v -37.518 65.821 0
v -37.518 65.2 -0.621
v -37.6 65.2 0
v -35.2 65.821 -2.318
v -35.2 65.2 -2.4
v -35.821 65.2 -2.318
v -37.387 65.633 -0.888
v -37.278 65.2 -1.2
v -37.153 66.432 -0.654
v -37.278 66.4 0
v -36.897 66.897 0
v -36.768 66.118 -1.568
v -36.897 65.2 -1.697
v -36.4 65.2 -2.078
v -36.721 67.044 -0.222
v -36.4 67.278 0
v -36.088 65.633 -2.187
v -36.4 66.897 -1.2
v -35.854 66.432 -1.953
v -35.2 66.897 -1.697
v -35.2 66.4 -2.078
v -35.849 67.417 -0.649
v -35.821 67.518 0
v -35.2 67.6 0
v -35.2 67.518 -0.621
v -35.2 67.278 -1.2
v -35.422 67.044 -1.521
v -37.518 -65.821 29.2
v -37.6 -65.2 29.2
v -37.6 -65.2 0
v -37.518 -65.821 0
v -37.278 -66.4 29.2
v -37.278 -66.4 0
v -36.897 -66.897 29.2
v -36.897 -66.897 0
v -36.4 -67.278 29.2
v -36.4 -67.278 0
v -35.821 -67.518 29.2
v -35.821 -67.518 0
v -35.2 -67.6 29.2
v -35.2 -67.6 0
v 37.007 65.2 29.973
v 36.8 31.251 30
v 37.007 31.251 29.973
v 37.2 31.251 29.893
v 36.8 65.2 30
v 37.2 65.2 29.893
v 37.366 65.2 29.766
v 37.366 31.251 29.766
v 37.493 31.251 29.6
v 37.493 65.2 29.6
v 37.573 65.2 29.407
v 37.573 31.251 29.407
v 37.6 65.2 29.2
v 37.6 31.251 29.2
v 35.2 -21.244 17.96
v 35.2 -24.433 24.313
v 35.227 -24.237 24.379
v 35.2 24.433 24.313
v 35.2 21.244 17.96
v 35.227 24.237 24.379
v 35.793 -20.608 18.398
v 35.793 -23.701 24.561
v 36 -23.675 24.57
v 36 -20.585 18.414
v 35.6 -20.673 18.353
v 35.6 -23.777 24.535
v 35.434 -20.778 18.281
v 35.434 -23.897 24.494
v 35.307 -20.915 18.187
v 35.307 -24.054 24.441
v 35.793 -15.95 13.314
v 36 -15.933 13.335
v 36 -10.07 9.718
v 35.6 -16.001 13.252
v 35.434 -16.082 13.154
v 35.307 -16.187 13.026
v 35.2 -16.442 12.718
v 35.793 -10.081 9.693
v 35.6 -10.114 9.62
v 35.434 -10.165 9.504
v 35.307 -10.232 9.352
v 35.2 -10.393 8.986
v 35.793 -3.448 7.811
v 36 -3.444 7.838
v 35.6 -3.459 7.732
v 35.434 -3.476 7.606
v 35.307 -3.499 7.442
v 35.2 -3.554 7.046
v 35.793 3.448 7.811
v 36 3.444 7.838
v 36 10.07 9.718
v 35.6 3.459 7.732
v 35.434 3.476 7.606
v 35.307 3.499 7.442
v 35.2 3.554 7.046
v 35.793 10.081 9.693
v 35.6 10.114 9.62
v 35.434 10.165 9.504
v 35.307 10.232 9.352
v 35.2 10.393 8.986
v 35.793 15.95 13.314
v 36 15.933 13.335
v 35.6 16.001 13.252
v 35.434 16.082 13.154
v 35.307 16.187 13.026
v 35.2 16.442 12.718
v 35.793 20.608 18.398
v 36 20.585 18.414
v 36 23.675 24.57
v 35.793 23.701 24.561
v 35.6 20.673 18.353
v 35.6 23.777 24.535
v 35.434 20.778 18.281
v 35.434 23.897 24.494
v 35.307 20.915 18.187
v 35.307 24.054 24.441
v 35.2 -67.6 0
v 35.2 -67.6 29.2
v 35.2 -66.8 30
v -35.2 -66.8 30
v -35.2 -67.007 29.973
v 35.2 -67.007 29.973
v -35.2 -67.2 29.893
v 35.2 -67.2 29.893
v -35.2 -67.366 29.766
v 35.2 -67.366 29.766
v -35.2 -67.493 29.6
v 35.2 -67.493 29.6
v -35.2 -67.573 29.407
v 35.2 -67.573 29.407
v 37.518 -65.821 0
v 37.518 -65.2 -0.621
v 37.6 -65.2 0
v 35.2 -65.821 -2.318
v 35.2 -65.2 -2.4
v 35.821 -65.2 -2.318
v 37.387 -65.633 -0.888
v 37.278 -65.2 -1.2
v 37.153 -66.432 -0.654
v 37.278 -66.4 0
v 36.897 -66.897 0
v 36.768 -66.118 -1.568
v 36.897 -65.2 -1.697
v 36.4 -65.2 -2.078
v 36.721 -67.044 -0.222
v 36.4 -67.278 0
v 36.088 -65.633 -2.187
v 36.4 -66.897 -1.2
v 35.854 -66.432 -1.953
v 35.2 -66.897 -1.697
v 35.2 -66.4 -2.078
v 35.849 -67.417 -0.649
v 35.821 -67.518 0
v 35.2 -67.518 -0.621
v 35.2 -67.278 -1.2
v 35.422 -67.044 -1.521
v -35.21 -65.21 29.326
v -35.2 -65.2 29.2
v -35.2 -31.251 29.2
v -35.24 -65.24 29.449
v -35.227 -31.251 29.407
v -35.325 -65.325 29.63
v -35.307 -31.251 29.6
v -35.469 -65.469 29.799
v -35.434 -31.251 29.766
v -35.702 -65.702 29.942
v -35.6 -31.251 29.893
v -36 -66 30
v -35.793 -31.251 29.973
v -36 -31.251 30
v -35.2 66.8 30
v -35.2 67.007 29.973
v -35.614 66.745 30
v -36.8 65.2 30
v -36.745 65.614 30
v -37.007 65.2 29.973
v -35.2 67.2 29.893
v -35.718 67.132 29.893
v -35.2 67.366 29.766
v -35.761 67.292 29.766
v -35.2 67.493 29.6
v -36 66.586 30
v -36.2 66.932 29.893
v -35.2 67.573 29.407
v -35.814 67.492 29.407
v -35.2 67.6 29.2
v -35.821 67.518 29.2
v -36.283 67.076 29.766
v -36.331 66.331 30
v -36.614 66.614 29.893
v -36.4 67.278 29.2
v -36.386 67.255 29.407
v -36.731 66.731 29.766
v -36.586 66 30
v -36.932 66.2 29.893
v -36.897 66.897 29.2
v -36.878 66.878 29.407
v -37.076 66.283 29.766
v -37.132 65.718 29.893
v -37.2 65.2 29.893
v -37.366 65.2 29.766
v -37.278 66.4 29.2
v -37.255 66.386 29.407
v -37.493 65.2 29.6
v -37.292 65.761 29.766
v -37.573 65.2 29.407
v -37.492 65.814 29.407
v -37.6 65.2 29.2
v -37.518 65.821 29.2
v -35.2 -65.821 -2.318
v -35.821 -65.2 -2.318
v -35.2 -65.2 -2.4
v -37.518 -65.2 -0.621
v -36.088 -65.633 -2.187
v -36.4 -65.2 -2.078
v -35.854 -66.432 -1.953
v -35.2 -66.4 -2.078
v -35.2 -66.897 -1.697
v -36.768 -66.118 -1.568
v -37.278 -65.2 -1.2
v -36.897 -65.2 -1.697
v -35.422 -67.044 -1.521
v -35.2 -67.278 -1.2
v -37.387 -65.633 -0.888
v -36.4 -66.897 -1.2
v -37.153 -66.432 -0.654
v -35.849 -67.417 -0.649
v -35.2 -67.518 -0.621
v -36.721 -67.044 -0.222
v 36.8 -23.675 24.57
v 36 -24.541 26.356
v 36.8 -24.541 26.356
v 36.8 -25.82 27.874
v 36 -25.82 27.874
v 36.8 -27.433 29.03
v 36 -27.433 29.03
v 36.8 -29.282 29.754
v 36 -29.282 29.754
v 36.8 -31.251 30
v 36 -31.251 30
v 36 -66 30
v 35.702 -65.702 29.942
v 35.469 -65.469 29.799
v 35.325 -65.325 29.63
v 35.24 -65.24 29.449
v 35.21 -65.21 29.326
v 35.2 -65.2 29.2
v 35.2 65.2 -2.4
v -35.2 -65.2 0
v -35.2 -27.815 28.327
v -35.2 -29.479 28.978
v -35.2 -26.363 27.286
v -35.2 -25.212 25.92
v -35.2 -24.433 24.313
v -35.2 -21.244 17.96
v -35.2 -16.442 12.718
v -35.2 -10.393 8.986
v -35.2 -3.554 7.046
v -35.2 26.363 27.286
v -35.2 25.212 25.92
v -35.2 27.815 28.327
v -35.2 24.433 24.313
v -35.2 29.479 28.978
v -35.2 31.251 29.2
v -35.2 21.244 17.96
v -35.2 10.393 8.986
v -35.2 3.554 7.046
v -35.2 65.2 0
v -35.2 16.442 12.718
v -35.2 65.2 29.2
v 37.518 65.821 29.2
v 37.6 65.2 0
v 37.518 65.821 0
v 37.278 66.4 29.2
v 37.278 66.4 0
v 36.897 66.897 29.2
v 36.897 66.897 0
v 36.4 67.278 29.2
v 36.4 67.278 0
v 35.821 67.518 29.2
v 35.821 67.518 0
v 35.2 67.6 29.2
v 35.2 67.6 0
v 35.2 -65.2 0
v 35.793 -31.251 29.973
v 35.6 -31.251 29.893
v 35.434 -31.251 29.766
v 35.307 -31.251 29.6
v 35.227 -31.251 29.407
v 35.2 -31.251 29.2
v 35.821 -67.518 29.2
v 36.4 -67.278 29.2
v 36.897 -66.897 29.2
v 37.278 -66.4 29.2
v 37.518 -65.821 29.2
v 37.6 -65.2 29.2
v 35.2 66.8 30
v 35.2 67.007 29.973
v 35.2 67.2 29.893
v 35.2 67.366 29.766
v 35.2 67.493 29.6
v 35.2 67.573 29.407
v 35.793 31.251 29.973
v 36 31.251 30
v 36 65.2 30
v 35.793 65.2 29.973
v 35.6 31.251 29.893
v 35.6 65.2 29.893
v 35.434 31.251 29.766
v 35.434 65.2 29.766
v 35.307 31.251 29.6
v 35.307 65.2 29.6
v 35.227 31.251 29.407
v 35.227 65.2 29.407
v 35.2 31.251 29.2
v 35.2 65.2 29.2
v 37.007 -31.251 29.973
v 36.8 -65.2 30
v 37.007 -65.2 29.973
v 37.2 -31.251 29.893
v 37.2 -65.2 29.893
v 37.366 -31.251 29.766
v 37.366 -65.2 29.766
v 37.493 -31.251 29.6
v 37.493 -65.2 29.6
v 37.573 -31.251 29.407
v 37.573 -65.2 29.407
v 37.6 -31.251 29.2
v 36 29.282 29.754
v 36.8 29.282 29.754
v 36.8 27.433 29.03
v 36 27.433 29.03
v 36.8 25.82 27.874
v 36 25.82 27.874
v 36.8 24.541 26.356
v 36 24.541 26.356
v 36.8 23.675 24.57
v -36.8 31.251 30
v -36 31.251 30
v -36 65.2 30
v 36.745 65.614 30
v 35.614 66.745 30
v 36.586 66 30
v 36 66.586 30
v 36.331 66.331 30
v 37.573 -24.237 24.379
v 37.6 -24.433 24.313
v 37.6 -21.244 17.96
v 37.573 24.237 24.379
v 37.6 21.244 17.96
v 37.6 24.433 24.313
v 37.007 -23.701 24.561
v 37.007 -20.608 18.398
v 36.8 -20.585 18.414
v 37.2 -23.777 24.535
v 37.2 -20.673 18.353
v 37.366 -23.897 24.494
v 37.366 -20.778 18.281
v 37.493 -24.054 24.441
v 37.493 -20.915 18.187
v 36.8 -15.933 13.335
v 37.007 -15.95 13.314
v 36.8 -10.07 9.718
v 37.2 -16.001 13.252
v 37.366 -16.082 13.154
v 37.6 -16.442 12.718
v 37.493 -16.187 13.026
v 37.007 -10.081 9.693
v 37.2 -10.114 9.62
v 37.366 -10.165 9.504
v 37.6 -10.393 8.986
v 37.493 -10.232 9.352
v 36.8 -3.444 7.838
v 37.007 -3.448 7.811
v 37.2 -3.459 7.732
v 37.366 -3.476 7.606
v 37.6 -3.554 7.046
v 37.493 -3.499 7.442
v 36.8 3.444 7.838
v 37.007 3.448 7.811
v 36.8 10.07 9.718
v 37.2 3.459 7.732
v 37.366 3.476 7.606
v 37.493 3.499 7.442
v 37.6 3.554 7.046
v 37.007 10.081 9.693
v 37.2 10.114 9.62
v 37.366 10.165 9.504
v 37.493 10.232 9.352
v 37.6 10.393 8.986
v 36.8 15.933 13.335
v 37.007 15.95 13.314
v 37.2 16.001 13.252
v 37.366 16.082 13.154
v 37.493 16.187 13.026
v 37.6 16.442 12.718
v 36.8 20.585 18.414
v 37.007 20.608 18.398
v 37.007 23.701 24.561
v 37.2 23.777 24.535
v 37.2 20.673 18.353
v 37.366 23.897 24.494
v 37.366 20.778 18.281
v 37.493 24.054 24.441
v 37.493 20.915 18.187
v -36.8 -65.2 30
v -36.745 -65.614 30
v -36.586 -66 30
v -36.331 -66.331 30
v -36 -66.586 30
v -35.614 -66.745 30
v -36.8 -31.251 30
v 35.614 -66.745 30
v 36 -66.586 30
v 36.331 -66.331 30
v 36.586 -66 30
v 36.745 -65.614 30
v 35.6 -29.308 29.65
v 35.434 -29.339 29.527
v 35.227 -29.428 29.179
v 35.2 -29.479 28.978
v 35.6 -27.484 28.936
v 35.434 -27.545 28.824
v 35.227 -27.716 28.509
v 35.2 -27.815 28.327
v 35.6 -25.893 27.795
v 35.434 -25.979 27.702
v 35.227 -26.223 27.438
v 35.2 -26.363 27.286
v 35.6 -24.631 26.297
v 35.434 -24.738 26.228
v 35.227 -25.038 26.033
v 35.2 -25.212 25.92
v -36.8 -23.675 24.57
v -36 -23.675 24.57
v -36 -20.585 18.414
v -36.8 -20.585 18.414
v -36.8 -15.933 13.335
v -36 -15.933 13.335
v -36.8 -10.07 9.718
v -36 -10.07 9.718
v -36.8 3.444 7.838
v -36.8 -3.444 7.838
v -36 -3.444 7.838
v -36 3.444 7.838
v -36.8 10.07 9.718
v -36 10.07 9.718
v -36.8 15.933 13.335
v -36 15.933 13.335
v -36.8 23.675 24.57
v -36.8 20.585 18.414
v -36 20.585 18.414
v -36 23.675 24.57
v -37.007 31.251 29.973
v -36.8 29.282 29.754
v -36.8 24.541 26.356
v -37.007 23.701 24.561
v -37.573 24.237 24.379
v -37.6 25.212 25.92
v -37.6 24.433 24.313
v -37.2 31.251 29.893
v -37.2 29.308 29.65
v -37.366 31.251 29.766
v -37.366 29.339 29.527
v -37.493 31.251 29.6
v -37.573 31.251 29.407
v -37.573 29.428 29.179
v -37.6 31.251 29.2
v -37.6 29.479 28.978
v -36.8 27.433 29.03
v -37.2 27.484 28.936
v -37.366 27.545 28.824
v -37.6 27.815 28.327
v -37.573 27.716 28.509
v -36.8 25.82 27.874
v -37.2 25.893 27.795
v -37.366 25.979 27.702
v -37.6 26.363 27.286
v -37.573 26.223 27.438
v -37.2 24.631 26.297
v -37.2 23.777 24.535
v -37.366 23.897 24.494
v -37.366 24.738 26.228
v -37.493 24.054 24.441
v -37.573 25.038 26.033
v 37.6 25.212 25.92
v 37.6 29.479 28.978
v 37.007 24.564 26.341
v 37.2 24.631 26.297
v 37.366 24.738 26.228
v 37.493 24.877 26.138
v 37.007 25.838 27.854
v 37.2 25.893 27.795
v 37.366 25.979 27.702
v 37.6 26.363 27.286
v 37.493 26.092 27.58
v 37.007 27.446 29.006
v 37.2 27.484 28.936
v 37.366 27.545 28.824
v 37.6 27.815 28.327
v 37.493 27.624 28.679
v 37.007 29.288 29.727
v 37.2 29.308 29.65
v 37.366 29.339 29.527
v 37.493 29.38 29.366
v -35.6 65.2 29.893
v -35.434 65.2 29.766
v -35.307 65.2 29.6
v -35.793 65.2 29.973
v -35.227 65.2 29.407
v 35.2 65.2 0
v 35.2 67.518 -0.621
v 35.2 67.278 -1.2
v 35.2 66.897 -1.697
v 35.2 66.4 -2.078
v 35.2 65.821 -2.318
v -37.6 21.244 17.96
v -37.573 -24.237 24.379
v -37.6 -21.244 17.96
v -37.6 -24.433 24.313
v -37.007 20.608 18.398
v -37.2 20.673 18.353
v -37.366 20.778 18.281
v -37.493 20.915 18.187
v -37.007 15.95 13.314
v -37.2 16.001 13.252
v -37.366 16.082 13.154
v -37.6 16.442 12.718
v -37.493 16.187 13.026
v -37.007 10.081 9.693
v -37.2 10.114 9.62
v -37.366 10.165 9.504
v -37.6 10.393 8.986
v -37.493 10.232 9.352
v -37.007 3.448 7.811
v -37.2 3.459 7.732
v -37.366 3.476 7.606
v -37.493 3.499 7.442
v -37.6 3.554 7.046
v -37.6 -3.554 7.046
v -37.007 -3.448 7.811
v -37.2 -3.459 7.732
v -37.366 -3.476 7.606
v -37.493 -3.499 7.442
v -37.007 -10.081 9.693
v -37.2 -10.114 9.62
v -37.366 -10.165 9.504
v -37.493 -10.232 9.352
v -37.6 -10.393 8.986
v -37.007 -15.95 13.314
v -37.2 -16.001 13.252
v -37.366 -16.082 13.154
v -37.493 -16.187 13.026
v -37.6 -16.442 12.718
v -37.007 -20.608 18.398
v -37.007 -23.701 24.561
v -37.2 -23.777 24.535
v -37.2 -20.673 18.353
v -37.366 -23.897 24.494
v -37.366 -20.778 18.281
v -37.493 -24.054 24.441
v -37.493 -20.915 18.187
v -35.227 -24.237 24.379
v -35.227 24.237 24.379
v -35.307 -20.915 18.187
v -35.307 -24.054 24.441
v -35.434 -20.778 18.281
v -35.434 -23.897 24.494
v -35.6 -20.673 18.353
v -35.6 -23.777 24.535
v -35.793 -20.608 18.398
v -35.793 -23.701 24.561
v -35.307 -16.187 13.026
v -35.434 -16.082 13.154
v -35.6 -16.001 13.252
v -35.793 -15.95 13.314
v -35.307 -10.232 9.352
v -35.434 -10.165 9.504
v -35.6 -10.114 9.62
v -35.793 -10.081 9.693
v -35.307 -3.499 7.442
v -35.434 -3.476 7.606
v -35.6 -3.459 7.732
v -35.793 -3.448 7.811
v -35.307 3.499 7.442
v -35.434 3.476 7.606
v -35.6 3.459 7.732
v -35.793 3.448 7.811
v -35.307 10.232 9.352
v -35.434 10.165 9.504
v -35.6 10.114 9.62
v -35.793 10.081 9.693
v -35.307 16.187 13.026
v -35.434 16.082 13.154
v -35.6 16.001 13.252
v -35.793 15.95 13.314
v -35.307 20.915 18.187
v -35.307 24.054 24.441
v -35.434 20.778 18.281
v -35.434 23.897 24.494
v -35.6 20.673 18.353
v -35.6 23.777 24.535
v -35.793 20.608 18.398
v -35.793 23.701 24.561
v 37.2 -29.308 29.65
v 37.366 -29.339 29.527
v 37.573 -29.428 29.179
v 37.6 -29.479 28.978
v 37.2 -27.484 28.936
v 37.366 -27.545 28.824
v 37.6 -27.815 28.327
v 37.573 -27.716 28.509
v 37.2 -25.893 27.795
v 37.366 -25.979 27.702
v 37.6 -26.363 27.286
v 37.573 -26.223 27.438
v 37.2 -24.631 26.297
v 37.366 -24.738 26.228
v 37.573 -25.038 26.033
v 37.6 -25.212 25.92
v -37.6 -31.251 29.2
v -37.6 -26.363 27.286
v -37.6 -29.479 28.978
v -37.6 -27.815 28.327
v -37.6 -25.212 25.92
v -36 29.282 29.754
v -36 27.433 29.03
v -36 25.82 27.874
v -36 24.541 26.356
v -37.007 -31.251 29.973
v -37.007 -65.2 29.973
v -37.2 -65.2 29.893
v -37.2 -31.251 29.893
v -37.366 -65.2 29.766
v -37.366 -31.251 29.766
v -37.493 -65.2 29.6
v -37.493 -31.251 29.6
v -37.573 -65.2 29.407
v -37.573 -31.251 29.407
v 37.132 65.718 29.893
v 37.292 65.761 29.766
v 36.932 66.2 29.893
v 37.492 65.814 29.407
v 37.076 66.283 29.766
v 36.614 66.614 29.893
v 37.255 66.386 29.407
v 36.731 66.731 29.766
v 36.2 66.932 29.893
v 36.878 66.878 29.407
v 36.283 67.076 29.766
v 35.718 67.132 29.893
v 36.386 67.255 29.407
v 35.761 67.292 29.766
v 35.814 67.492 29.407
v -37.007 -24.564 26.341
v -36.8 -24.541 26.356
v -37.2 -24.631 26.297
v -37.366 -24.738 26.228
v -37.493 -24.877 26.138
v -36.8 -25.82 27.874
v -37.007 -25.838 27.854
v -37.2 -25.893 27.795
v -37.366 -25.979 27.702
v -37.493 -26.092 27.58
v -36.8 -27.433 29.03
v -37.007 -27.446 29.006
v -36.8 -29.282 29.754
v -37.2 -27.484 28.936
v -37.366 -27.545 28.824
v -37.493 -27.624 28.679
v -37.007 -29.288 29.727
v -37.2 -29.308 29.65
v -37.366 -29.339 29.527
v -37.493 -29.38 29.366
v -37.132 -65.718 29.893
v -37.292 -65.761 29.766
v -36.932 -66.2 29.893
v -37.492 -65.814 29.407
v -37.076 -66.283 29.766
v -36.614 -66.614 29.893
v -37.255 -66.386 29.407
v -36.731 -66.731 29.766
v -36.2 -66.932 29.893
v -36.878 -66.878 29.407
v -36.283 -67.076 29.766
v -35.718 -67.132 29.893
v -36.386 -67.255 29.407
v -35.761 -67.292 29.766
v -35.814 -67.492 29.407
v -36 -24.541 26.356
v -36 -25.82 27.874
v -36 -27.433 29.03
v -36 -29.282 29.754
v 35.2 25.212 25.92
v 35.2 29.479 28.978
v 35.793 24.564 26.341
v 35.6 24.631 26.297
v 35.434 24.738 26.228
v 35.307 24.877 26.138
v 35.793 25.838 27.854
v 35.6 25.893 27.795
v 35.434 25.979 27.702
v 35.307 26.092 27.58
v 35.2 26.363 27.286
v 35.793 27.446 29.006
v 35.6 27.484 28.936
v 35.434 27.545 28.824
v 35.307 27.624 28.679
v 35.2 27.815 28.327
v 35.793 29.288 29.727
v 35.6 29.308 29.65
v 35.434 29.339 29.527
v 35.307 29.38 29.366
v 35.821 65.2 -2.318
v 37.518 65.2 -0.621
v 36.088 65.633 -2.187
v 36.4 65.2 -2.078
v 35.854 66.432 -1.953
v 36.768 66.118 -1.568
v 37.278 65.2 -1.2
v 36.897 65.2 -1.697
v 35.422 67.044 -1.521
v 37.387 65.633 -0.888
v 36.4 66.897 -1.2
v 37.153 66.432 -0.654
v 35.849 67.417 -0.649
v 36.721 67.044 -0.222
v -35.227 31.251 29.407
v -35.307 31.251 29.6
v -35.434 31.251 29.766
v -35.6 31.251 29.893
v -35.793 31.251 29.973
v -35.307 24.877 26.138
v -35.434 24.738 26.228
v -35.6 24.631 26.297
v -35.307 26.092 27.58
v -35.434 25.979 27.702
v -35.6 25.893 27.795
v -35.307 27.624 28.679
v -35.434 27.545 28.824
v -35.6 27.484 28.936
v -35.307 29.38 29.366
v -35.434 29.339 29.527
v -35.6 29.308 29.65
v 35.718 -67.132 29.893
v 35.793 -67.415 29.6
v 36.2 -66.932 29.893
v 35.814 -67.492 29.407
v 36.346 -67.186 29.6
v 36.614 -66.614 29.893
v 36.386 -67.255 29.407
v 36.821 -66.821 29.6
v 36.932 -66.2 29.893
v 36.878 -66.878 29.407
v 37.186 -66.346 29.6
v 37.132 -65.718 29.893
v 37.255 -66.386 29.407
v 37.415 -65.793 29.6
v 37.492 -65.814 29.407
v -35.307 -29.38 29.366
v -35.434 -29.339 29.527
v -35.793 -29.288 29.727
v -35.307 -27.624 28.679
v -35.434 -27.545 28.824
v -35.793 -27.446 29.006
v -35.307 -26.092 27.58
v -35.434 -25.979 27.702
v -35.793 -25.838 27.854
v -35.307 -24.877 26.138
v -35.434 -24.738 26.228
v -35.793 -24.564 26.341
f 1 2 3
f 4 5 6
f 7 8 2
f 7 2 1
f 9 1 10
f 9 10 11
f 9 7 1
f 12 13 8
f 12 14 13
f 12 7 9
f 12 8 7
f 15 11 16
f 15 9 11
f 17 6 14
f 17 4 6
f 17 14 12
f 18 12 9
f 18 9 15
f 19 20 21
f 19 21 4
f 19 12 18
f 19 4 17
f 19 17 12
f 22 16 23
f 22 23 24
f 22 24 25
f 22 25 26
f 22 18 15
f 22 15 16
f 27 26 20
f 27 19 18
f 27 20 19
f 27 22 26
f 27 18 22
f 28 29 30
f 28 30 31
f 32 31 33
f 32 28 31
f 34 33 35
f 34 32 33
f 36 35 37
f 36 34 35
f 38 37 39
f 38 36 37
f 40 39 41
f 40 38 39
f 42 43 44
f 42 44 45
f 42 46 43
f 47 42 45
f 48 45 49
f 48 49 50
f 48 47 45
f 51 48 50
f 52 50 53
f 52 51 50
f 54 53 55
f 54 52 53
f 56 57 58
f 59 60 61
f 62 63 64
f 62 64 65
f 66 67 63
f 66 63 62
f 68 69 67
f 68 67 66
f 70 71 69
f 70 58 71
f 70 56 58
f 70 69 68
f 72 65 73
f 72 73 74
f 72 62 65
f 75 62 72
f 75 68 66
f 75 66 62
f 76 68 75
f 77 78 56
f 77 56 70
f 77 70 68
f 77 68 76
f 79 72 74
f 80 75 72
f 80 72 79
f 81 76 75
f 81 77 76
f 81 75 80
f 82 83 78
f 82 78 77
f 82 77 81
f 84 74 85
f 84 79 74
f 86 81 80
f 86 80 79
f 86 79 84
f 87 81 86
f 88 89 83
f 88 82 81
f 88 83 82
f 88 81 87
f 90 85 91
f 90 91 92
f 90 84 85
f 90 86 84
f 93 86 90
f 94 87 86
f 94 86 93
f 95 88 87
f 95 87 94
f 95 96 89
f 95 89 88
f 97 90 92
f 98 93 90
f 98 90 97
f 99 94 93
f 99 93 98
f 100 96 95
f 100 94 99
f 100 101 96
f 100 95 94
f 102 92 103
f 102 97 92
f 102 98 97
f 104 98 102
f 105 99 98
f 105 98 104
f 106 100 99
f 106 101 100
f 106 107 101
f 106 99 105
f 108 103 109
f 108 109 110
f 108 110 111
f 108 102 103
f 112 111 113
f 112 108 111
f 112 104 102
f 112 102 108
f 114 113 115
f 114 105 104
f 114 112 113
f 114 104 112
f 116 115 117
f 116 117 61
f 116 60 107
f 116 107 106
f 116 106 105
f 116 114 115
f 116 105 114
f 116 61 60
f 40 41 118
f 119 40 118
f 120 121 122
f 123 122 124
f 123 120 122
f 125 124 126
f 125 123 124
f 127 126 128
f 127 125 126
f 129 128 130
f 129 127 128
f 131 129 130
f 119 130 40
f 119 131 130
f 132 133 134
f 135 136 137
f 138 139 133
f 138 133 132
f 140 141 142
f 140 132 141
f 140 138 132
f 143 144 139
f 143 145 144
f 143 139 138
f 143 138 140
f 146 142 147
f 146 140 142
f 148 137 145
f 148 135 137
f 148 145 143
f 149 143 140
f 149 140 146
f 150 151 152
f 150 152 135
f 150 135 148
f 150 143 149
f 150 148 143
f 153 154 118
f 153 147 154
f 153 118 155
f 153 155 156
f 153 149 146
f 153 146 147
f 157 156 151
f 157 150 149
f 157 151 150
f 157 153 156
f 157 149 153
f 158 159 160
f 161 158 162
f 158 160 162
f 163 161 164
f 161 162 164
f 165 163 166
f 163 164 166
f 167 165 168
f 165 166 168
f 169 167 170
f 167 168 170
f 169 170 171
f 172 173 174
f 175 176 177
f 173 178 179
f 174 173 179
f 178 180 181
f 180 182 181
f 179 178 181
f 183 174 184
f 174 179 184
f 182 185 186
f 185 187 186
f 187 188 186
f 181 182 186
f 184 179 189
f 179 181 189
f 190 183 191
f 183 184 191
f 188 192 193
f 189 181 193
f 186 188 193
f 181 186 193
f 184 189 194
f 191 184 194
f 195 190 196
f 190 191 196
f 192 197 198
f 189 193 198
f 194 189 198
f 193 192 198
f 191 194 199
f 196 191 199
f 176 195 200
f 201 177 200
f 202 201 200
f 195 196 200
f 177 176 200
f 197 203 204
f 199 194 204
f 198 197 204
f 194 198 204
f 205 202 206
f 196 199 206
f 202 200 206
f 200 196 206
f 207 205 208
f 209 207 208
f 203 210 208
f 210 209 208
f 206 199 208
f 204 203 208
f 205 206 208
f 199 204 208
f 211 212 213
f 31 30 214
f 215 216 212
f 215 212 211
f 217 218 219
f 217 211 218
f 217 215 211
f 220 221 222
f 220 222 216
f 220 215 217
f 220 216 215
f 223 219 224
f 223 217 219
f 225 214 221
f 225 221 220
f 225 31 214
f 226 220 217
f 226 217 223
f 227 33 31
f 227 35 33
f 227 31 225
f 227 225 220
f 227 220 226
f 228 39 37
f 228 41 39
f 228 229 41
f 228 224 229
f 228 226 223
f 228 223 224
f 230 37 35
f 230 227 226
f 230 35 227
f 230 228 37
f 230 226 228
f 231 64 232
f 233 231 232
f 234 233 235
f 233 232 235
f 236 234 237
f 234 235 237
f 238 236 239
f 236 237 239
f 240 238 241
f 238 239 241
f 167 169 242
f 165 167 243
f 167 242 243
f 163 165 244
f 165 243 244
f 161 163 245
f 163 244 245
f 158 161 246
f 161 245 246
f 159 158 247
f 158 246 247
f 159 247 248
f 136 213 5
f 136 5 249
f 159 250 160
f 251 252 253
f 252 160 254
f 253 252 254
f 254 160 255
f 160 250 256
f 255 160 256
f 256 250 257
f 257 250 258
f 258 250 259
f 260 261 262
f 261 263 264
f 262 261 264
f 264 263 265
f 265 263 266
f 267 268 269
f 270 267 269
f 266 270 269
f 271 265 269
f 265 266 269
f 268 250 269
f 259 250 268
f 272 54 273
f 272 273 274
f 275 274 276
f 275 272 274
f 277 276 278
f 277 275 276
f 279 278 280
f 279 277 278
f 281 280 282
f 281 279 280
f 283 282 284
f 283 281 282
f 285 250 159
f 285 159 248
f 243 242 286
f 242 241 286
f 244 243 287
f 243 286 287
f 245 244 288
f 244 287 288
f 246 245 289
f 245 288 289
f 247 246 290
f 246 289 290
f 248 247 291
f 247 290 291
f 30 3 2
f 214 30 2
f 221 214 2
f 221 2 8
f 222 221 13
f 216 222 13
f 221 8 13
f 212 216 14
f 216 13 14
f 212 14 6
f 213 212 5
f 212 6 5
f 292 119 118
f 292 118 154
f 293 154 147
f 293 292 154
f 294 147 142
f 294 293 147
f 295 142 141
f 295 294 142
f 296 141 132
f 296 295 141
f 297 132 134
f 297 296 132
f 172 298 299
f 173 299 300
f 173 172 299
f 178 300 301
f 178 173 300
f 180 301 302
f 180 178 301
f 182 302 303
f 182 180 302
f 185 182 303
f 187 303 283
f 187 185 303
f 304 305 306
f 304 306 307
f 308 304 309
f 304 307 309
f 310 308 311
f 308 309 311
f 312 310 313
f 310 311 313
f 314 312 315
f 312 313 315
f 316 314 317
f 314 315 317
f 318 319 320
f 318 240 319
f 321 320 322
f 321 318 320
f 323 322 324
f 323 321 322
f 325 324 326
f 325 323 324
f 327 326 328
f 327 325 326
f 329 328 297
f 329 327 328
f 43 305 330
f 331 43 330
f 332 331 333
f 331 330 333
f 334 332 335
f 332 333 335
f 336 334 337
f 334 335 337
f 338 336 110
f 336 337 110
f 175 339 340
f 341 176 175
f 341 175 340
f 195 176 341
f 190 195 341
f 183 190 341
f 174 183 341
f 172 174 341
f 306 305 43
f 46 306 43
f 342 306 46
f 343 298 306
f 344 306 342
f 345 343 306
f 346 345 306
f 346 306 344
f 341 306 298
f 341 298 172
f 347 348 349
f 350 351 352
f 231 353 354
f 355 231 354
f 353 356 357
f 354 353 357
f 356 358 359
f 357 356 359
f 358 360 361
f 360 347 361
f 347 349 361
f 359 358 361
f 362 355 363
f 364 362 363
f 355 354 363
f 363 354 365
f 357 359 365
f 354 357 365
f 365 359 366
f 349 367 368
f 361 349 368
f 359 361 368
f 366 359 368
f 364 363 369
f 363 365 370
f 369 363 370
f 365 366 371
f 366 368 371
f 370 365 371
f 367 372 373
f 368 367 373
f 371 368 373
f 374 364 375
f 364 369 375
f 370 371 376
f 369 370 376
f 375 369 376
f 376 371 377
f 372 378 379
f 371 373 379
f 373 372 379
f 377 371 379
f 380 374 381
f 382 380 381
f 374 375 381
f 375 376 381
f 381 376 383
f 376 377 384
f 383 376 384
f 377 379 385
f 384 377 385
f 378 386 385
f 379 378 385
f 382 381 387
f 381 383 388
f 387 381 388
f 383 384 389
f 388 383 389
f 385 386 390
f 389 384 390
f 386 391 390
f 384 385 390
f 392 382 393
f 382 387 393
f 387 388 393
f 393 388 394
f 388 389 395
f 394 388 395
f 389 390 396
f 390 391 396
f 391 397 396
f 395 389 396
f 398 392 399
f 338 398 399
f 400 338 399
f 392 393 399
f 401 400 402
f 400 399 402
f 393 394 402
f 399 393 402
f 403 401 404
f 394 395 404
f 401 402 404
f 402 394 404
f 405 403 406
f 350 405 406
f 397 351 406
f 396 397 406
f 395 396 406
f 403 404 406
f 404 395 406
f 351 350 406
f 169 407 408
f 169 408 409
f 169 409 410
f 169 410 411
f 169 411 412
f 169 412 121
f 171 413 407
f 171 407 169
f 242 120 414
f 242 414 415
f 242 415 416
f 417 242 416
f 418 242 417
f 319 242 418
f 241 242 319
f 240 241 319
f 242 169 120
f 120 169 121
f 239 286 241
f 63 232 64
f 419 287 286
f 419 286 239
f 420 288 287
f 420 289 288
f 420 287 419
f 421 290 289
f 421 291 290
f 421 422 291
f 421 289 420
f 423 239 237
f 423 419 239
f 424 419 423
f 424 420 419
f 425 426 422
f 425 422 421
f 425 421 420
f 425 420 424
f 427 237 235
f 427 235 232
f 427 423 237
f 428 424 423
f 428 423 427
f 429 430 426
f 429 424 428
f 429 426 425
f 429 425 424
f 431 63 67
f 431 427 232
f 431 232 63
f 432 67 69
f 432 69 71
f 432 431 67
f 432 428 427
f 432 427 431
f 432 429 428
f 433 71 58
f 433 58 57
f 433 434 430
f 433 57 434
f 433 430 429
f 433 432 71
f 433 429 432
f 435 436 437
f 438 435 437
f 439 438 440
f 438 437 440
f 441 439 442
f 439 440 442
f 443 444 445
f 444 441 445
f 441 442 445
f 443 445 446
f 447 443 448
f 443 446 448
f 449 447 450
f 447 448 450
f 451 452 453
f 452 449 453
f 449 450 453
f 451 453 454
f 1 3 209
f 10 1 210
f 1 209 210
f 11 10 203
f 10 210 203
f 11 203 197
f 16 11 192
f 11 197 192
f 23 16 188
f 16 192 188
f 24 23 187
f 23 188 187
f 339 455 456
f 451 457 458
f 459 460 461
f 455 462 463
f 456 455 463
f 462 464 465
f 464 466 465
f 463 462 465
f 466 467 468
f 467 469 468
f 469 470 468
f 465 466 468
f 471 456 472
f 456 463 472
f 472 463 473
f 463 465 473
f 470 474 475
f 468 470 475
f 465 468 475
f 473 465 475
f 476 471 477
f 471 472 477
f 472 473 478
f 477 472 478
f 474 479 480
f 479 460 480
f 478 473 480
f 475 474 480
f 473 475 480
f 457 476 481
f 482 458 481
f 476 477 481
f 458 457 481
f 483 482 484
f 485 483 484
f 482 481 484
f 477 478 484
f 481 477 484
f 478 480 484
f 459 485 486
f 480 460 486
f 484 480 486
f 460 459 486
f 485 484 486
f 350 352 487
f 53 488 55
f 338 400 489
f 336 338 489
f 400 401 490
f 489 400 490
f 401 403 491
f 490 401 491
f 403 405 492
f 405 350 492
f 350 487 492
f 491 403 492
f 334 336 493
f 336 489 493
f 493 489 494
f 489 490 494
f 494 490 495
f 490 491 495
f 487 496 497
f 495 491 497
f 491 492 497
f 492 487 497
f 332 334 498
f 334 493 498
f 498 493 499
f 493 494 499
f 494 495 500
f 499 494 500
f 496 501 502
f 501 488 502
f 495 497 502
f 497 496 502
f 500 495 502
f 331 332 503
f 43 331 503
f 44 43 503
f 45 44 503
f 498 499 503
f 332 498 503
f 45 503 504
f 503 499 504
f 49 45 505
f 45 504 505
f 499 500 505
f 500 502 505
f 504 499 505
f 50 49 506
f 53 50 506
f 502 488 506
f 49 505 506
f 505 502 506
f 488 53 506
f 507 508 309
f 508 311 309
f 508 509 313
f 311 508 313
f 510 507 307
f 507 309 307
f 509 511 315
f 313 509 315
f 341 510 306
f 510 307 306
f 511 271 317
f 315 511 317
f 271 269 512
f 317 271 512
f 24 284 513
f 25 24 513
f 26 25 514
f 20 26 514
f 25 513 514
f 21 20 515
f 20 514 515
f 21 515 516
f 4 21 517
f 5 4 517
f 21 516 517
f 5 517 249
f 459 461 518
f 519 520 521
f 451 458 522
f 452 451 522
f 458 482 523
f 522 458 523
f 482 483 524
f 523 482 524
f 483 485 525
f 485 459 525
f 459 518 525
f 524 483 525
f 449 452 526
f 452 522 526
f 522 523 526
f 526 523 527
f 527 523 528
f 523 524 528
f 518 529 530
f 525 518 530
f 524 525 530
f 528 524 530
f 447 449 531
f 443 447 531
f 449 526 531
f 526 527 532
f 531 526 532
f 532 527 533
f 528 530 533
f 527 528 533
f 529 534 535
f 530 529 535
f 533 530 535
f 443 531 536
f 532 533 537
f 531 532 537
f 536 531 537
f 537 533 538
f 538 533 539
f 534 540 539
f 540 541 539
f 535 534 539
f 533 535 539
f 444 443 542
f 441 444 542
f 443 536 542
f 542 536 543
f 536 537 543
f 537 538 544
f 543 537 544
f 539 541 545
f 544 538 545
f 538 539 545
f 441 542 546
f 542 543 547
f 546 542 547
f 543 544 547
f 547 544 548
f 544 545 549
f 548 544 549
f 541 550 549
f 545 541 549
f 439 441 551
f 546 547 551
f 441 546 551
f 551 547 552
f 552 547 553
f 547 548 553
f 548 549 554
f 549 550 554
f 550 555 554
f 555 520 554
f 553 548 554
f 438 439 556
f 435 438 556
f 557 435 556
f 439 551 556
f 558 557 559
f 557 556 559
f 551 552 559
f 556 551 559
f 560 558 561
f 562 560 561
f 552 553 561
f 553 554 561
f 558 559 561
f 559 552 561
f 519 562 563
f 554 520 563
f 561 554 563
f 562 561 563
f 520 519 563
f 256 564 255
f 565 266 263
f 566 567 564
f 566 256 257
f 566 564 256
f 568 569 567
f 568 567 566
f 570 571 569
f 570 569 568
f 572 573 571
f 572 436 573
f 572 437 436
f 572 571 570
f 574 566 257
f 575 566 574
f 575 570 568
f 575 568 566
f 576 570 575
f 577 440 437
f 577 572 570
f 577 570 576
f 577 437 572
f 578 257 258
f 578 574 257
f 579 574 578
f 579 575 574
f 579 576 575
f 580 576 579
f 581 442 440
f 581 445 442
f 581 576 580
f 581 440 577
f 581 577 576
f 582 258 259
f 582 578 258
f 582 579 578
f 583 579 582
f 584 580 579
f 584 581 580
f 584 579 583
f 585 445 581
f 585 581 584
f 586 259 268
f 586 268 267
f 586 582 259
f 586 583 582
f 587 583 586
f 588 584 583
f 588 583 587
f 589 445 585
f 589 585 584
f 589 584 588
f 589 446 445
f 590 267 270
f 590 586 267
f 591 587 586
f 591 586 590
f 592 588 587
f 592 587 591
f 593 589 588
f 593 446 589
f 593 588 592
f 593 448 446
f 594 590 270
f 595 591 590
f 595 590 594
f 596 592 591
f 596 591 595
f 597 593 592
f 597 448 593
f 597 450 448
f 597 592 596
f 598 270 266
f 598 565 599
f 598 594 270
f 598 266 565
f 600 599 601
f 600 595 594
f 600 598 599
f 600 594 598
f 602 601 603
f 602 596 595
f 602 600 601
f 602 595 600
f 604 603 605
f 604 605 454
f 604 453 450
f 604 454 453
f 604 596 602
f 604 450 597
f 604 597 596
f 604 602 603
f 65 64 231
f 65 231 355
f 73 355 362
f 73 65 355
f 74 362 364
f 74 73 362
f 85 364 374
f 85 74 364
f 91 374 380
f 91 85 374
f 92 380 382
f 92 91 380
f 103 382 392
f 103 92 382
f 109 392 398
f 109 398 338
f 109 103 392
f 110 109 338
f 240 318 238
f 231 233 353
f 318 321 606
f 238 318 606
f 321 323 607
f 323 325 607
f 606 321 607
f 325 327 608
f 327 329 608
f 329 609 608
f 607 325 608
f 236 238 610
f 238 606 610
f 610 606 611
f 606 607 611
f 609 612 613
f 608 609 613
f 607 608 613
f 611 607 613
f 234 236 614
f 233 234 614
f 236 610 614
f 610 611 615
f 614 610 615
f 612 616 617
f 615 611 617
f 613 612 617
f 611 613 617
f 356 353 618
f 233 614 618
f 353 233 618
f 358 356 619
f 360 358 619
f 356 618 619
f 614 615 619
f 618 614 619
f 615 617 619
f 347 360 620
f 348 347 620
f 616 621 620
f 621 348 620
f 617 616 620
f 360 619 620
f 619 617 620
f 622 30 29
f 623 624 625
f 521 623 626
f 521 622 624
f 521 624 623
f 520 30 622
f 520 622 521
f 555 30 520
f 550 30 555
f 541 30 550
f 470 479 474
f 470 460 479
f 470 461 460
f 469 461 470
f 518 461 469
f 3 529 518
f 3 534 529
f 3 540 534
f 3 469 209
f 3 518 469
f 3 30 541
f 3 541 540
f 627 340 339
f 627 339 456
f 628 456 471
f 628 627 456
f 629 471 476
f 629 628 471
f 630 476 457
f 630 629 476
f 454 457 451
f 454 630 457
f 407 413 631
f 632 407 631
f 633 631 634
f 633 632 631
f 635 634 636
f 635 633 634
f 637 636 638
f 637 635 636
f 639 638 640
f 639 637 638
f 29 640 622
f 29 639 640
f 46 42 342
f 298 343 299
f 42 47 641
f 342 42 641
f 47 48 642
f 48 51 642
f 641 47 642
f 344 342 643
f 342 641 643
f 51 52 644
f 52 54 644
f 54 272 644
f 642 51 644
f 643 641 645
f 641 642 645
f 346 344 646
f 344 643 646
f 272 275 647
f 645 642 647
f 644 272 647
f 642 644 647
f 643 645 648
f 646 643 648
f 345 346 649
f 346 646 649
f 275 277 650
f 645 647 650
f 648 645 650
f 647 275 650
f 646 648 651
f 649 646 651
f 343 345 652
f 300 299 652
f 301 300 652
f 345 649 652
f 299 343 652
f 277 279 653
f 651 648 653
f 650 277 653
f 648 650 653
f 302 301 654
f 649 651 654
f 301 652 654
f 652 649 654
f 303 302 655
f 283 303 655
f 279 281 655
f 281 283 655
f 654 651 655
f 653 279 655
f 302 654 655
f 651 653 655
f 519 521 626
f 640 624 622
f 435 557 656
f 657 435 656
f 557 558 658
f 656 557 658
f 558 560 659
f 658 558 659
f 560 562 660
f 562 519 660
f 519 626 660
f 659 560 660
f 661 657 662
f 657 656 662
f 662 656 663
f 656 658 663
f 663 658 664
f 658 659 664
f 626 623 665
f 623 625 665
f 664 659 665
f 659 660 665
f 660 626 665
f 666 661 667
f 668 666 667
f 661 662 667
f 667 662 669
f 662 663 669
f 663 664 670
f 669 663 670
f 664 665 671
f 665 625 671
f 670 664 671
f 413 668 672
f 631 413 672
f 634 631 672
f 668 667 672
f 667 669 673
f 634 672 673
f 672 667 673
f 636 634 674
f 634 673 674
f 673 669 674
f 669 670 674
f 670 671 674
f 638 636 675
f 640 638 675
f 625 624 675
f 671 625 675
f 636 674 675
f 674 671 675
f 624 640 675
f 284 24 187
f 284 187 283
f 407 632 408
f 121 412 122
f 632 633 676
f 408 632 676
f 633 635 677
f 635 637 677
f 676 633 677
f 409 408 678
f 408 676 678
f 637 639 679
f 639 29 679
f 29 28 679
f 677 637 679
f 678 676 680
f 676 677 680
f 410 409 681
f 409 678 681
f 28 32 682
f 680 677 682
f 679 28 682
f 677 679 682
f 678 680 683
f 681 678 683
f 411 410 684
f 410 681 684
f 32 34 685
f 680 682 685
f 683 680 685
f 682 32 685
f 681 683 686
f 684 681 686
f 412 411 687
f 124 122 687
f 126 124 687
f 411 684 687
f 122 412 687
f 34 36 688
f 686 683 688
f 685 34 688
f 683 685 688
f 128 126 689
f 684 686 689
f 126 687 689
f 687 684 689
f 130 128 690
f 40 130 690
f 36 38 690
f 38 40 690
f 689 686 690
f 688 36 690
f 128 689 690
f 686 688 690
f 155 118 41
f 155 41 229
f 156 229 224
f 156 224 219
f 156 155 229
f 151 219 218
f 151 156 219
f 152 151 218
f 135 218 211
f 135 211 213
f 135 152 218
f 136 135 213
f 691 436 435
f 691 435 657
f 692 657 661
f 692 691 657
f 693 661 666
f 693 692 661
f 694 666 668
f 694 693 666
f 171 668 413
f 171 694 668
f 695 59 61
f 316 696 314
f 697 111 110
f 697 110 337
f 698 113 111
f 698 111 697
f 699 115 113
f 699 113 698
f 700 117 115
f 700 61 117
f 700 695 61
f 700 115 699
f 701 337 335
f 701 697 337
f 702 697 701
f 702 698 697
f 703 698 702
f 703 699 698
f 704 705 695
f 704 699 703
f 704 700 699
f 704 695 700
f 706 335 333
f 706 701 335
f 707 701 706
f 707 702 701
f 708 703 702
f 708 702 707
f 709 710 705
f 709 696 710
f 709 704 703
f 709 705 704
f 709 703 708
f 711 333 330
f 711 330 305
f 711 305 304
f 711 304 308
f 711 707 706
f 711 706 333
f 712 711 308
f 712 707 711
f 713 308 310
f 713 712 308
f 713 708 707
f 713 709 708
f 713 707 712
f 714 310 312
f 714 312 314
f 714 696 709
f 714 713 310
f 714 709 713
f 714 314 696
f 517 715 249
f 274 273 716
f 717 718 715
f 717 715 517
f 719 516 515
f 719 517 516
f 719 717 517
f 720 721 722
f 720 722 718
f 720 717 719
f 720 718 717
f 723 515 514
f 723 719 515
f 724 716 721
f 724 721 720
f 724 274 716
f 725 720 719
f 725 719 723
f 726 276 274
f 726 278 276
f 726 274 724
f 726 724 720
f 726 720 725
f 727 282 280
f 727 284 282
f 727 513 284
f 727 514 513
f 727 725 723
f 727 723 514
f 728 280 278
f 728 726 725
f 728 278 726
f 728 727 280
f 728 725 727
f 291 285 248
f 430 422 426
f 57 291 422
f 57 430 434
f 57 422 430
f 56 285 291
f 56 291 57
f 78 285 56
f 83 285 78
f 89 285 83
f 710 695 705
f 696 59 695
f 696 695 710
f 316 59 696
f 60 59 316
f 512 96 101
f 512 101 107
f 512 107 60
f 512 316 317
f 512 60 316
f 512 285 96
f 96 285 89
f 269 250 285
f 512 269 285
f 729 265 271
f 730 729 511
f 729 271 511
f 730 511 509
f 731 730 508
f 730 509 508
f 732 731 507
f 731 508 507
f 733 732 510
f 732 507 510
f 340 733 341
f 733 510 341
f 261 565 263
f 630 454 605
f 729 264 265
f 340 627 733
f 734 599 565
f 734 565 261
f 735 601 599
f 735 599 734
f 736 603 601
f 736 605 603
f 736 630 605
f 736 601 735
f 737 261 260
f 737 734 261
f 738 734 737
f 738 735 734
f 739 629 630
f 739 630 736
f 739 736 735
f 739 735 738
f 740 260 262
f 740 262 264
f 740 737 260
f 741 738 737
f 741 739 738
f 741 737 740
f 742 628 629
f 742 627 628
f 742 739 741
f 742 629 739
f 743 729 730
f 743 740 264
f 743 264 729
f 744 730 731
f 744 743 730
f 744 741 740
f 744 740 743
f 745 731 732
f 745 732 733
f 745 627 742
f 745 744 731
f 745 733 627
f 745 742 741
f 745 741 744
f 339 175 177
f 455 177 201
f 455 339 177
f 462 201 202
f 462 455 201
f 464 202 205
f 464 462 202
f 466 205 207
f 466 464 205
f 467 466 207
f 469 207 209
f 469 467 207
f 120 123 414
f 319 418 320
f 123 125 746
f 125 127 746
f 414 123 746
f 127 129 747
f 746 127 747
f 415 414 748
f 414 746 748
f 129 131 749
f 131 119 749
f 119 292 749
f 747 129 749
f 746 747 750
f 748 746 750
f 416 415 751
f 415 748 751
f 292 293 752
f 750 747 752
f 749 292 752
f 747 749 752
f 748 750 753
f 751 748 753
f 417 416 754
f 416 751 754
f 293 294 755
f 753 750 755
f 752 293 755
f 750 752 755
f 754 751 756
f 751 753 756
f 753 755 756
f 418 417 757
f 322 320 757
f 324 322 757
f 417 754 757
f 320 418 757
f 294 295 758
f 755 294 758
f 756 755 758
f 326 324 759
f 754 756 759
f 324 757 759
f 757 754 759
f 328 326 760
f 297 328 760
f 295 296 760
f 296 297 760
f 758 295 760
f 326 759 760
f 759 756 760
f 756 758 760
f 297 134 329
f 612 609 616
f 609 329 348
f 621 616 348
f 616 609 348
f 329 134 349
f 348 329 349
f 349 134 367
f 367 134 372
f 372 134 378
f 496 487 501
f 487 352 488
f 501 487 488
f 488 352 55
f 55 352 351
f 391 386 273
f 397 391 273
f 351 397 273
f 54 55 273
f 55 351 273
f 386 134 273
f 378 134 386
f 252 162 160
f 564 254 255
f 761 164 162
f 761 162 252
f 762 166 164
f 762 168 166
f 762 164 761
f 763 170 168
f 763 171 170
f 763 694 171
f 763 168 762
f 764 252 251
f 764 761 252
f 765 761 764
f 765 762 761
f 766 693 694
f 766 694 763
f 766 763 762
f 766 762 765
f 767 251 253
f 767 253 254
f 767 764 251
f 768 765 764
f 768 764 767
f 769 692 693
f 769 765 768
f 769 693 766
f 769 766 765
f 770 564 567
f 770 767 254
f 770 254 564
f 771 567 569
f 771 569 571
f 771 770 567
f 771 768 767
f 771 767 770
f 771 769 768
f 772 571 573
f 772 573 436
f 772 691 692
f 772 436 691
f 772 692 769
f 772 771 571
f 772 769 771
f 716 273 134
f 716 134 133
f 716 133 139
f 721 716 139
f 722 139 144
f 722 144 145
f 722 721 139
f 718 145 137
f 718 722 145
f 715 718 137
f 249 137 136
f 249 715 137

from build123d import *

# Parameters (mm, degrees)
SKETCH014_W          = 70.4
SKETCH014_H          = 130.4
PAD004_DEPTH         = 30
THICKNESS_T          = 2.4
POCKET005_DEPTH      = 37.601
POCKET005_DEPTH_BACK = 37.601
FILLET006_R          = 0.8


with BuildPart() as part:
    # Sketch014 → Pad004 (new body)
    with BuildSketch(Plane.XY):
        Rectangle(SKETCH014_W, SKETCH014_H)
    extrude(amount=PAD004_DEPTH)

    # Thickness
    thickness_openings = [part.faces().sort_by_distance(p)[0] for p in [
        (0, 0, 30),
    ]]
    offset(amount=THICKNESS_T, openings=thickness_openings)

    # Sketch015 → Pocket005 (cut, two sides)
    with BuildSketch(Plane.YZ) as pocket005_sk:
        with BuildLine():
            ThreePointArc((-23.675182, 24.569697), (0, 7.6), (23.675182, 24.569697))
            ThreePointArc((31.25124, 30), (26.590638, 28.502214), (23.675182, 24.569697))
            Line((-31.25124, 30), (31.25124, 30))
            ThreePointArc((-23.675182, 24.569697), (-26.590638, 28.502214), (-31.25124, 30))
        make_face()
    extrude(amount=-POCKET005_DEPTH, mode=Mode.SUBTRACT)
    extrude(pocket005_sk.sketch, amount=POCKET005_DEPTH_BACK, mode=Mode.SUBTRACT)

    # Fillet006
    fillet006_edges = [part.edges().sort_by_distance(p)[0] for p in [
        (0, -65.2, 30),
        (35.2, -48.22562, 30),
        (36.4, -31.25124, 30),
        (37.6, -48.22562, 30),
        (36.897056, -66.897056, 30),
        (0, -67.6, 30),
        (-36.897056, -66.897056, 30),
        (-37.6, -48.22562, 30),
        (-36.4, -31.25124, 30),
        (-35.2, -48.22562, 30),
    ]]
    fillet(fillet006_edges, radius=FILLET006_R)


solid = part.part
